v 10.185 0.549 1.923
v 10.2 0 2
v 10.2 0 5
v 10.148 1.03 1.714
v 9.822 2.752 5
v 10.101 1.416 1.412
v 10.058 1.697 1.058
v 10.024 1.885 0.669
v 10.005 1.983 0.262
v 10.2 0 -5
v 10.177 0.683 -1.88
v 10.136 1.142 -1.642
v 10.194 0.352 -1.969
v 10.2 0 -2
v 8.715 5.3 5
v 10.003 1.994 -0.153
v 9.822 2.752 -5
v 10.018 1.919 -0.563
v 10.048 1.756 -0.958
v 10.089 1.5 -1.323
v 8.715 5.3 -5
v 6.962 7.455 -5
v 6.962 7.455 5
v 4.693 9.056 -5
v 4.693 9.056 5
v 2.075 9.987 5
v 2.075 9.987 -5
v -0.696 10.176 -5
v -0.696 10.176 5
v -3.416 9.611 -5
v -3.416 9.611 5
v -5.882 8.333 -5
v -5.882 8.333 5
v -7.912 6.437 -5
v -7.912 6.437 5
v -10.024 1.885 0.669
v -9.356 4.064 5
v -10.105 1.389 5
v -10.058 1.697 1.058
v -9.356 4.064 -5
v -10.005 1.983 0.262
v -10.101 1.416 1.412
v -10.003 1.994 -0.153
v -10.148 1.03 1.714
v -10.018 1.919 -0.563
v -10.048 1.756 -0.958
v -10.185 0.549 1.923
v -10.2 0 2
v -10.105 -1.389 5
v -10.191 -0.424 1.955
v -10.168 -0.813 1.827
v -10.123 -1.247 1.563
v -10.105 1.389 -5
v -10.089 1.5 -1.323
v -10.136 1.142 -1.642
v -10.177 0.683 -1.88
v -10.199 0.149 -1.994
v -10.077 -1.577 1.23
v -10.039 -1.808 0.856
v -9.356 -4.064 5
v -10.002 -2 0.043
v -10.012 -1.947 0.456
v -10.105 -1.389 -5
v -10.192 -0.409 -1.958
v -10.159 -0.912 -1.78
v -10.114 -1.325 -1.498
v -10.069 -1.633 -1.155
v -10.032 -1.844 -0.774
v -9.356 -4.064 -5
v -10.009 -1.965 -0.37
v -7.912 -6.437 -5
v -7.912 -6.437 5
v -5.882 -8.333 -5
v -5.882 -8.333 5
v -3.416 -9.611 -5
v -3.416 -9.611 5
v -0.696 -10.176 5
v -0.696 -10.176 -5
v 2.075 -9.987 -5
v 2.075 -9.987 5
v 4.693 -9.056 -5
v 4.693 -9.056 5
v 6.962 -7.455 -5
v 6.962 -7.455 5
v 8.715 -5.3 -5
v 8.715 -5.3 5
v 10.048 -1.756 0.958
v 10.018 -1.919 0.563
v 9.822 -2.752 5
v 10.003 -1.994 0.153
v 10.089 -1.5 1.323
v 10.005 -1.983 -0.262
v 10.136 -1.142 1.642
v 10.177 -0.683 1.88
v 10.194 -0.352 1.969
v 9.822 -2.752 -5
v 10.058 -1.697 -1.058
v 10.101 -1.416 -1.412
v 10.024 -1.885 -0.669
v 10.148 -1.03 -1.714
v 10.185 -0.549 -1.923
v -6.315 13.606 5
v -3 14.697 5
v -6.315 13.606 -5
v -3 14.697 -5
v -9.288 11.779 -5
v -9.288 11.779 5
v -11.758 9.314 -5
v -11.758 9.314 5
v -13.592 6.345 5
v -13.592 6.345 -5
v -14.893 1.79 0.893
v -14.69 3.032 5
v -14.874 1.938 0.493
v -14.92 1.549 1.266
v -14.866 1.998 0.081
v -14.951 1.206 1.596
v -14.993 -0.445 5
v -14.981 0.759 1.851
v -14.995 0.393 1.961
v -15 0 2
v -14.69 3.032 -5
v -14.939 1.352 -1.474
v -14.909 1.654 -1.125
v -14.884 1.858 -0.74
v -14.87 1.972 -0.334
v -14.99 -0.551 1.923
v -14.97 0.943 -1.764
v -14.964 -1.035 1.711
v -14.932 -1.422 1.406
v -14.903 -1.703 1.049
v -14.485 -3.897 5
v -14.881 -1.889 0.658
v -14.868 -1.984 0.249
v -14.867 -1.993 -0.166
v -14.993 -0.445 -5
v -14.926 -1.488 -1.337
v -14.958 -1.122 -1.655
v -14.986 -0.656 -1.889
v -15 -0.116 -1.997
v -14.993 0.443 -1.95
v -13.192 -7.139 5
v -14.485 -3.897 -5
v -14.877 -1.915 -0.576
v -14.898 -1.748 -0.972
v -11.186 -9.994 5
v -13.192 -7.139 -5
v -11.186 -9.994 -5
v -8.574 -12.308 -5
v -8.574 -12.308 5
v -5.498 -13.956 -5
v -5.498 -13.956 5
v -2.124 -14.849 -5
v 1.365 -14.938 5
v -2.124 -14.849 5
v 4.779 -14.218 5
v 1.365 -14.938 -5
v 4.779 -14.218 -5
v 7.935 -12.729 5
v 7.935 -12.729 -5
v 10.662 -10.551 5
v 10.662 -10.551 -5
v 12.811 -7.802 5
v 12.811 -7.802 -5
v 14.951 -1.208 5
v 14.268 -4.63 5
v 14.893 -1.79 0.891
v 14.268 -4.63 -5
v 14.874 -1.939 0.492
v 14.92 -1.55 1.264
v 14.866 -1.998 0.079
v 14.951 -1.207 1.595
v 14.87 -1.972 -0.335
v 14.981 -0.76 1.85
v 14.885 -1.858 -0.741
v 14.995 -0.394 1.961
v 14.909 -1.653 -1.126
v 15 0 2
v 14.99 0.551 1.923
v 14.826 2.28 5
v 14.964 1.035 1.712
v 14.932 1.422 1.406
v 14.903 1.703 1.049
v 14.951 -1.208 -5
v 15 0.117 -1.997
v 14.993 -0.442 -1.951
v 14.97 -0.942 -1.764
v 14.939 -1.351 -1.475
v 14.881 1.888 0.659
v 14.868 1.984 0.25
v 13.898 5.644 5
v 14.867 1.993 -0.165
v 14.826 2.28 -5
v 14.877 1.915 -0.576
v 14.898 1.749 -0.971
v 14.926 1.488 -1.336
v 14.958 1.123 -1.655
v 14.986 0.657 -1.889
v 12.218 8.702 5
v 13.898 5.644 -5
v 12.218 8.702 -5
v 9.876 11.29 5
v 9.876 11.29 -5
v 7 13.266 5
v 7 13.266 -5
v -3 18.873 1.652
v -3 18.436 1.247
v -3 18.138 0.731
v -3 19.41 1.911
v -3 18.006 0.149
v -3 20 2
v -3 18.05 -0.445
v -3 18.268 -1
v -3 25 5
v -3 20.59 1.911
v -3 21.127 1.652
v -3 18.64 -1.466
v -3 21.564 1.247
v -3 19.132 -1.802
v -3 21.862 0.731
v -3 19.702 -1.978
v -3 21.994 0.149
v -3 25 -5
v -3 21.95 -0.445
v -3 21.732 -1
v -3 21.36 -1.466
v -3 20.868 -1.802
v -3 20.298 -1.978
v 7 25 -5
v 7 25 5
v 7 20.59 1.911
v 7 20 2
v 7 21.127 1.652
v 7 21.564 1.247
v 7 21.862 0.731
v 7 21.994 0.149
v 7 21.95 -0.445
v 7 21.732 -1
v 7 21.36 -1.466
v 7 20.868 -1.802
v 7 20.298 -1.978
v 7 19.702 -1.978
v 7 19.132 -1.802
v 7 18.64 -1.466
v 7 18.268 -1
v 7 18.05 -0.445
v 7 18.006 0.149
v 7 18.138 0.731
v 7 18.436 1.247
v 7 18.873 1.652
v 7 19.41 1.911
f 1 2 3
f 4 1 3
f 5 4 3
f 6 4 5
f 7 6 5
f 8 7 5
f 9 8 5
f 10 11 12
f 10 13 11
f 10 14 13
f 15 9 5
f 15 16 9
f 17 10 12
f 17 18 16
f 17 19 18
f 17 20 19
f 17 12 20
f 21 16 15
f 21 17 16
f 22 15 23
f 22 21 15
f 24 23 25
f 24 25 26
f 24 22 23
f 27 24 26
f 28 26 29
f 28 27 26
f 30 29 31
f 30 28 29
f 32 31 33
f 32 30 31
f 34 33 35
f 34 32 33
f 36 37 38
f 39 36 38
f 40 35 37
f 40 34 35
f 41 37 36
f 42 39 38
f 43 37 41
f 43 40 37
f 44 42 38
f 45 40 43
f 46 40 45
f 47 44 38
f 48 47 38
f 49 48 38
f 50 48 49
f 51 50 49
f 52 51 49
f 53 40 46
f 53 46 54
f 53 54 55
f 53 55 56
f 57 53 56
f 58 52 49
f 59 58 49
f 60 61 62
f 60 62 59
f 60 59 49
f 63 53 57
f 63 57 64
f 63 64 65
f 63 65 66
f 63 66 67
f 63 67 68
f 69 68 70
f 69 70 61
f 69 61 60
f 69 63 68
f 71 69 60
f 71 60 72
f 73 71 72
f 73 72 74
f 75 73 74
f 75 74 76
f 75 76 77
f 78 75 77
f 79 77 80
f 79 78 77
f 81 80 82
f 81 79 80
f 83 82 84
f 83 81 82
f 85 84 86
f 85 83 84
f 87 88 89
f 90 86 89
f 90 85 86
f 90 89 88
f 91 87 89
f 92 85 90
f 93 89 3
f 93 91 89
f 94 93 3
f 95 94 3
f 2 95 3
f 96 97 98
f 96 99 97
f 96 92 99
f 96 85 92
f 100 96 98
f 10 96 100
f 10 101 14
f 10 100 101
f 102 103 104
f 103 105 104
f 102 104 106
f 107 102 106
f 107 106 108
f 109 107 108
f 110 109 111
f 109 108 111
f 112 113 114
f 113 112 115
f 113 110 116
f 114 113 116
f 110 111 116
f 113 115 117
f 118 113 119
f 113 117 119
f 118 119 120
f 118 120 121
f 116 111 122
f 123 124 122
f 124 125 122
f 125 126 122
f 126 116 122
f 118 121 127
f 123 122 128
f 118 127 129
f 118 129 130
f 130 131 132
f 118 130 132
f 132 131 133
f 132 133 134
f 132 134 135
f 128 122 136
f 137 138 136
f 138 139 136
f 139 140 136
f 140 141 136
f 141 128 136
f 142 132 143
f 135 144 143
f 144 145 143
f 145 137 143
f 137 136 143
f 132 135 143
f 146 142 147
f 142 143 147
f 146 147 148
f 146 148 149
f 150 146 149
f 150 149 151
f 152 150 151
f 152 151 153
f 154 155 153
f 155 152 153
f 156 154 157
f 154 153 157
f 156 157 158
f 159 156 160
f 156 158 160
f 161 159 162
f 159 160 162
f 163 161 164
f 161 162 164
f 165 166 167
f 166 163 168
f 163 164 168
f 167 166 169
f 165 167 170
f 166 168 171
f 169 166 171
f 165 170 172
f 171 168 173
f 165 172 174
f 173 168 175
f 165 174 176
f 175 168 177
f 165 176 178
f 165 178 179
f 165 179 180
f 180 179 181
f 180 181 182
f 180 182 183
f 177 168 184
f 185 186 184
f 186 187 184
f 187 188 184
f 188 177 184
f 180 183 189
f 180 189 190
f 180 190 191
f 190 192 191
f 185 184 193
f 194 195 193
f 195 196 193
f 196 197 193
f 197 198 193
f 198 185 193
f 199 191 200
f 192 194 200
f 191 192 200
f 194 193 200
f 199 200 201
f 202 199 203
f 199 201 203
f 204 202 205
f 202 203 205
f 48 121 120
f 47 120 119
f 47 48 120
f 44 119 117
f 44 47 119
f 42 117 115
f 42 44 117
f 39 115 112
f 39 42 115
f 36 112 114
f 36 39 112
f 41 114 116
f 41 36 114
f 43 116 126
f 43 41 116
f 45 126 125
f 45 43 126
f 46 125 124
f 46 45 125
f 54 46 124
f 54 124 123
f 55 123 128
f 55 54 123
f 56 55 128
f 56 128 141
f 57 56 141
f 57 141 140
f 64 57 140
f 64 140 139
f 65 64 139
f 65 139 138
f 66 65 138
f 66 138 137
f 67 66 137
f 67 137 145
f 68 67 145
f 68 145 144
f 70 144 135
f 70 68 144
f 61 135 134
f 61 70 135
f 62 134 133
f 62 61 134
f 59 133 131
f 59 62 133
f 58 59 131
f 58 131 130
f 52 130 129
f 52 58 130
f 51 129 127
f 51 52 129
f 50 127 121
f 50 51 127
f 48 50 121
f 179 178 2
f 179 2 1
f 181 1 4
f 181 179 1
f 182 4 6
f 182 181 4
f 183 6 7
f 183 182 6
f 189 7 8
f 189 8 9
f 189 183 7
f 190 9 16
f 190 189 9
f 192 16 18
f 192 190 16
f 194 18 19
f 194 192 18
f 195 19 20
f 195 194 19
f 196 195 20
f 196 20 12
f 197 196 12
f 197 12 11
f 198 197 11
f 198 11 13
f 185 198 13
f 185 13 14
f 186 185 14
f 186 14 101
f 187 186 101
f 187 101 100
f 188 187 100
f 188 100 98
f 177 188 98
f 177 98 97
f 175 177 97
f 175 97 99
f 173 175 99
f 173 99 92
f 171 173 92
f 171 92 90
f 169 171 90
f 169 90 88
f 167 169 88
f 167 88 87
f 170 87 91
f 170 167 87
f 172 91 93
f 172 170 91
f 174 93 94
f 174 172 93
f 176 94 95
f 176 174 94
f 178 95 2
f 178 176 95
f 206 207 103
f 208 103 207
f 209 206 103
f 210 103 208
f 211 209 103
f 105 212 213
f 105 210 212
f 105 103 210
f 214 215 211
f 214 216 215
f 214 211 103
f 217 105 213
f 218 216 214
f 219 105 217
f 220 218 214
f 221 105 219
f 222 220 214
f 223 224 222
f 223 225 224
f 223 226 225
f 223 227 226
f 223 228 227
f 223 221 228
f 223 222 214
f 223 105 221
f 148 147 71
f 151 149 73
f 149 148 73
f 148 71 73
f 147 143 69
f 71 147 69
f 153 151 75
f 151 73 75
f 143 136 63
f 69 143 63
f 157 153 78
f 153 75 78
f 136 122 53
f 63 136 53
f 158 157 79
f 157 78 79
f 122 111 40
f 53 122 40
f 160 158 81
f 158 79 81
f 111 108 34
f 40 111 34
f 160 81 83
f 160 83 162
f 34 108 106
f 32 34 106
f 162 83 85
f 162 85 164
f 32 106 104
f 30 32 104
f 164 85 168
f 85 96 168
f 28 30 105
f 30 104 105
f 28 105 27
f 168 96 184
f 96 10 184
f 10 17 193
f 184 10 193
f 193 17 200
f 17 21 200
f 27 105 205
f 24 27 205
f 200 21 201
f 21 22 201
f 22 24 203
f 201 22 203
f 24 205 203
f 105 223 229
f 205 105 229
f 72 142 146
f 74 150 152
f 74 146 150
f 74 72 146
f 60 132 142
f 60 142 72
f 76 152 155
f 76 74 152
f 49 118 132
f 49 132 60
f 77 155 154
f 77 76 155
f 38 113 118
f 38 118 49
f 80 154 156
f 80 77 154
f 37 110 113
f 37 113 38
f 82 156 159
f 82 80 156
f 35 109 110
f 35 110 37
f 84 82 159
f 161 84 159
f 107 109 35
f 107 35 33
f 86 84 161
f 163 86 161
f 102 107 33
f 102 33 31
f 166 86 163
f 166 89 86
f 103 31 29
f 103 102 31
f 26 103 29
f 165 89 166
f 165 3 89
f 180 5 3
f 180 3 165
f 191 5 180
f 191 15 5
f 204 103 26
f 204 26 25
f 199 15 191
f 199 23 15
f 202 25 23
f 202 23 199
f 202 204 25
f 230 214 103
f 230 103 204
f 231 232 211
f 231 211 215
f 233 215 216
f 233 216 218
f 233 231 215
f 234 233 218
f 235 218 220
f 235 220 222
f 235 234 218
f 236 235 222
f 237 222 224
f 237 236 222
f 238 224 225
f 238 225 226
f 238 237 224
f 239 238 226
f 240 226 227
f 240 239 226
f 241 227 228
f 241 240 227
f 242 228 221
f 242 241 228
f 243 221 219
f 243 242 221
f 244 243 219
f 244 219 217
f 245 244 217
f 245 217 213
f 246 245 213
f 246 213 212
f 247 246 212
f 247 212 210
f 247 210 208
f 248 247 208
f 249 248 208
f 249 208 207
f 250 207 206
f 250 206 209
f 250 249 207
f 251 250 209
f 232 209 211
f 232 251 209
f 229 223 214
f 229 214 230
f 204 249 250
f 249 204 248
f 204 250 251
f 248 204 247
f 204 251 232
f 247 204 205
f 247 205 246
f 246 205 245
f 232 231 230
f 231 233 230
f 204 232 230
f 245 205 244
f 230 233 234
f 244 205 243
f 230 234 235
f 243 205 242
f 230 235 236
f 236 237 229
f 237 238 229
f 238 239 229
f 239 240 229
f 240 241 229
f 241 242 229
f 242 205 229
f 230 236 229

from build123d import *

# Parameters (mm, degrees)
CYLINDER003_R     = 2
CYLINDER003_DEPTH = 10
CYLINDER004_R     = 2
CYLINDER004_DEPTH = 30
CYLINDER001_R     = 10.2
CYLINDER001_DEPTH = 10
BOX_W             = 10
BOX_H             = 15
BOX_DEPTH         = 10
CYLINDER_R        = 15
CYLINDER_DEPTH    = 10


with BuildPart() as cylinder003:
    # Cylinder003 → Cylinder003 (new body)
    with BuildSketch(Plane(origin=(7, 20, 0), x_dir=(0, 0, 1), z_dir=(-1, 0, 0))):
        Circle(CYLINDER003_R)
    extrude(amount=CYLINDER003_DEPTH)


with BuildPart() as cylinder004:
    # Cylinder004 → Cylinder004 (new body)
    with BuildSketch(Plane.ZY.offset(-15)):
        Circle(CYLINDER004_R)
    extrude(amount=CYLINDER004_DEPTH)


with BuildPart() as negative_fusion:
    # Cylinder001 → Cylinder001 (new body)
    with BuildSketch(Plane.XY.offset(-5)):
        Circle(CYLINDER001_R)
    extrude(amount=CYLINDER001_DEPTH)

    # Fusion: union Cylinder003, Cylinder004
    add(cylinder003.part)
    add(cylinder004.part)


with BuildPart() as cube:
    # Box → Box (new body)
    with BuildSketch(Plane(origin=(-3, 10, -5), x_dir=(1, 0, 0), z_dir=(0, 0, 1))):
        with Locations((5, 7.5)):
            Rectangle(BOX_W, BOX_H)
    extrude(amount=BOX_DEPTH)


with BuildPart() as cut:
    # Cylinder → Cylinder (new body)
    with BuildSketch(Plane.XY.offset(-5)):
        Circle(CYLINDER_R)
    extrude(amount=CYLINDER_DEPTH)

    # Fusion001: union Cube
    add(cube.part)

    # Cut: cut Negative Fusion
    add(negative_fusion.part, mode=Mode.SUBTRACT)


solid = cut.part
